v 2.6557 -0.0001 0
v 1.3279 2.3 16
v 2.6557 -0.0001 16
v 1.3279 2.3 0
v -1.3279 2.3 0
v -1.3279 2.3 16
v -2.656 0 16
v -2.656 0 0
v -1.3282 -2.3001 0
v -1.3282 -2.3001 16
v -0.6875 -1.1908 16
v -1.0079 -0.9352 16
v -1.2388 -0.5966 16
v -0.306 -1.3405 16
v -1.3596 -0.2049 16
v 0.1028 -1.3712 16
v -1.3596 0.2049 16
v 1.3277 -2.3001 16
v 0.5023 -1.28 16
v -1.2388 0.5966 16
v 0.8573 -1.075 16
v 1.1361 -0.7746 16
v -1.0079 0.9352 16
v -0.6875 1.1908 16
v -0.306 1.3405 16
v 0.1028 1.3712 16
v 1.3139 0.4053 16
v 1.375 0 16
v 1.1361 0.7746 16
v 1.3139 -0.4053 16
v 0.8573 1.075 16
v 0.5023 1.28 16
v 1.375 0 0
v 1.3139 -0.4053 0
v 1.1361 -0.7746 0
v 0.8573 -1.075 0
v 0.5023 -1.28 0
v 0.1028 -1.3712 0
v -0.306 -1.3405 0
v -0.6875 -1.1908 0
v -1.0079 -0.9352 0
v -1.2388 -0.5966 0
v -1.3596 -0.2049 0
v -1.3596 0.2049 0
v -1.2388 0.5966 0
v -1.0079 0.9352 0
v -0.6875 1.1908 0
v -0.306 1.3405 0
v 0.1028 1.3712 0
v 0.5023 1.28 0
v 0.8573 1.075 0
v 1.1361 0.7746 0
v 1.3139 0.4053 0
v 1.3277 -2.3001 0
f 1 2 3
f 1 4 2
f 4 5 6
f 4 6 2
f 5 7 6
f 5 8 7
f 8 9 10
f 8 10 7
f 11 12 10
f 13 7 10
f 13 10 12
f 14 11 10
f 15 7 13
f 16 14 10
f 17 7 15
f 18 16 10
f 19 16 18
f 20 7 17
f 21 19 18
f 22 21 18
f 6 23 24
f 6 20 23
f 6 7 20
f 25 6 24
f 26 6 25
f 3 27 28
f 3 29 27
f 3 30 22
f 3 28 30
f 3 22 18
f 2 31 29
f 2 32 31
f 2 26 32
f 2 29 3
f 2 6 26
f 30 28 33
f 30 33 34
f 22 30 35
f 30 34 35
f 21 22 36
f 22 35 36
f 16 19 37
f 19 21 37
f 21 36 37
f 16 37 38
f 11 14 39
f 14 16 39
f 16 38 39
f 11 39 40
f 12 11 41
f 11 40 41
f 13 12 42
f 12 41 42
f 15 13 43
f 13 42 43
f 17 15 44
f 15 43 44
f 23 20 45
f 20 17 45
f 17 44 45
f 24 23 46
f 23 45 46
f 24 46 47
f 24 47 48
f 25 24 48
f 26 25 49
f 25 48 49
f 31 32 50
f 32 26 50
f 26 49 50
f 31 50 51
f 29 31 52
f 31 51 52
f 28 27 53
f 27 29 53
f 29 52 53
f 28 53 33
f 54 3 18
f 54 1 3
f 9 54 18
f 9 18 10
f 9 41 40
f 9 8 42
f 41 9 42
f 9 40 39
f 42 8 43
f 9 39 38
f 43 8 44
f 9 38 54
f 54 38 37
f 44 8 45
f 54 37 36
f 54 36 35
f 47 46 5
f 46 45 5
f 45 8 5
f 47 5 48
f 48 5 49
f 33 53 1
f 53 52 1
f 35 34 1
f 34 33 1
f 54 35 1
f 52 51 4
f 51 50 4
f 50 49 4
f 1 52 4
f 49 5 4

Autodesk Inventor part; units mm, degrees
ref_plane "YZ Plane" through (0, 0, 0) normal (1, 0, 0) x (0, 1, 0)
ref_plane "XZ Plane" through (0, 0, 0) normal (0, 1, 0) x (-1, 0, 0)
ref_plane "XY Plane" through (0, 0, 0) normal (0, 0, 1) x (1, 0, 0)
sketch "Sketch1" plane through (0, 0, 0) normal (0, 0, 1) x (1, 0, 0)
  line L0 (-1.3279, 2.3) -> (1.3279, 2.3)
  line L1 (0, 2.3) -> (0, 0) construction
  circle A0 centre (0, 0) radius 2.3 construction
  line L2 (-2.656, 0) -> (-1.3279, 2.3)
  line L3 (-1.9919, 1.15) -> (0, 0) construction
  line L4 (-1.3282, -2.3001) -> (-2.656, 0)
  line L5 (-1.9919, -1.15) -> (0, 0) construction
  line L6 (1.3277, -2.3001) -> (-1.3282, -2.3001)
  line L7 (0, -2.3) -> (0, 0) construction
  line L8 (2.6557, -0.0001) -> (1.3277, -2.3001)
  line L9 (1.9919, -1.15) -> (0, 0) construction
  line L10 (1.3279, 2.3) -> (2.6557, -0.0001)
  line L11 (1.9919, 1.15) -> (0, 0) construction
  circle A1 centre (0, 0) radius 1.375
  point P0 (-2.656, 0)
  point P1 (2.6557, -0.0001)
  point P2 (-2.656, 0)
  dimension "d8" = 120
  dimension "d9" = 120.003
  dimension "d11" = 4.6
  dimension "d0" = 2.3
  dimension "d13" = 2.75
extrude "Extrusion1" add sketch "Sketch1" along normal blind 16
properties part number "spacer"
